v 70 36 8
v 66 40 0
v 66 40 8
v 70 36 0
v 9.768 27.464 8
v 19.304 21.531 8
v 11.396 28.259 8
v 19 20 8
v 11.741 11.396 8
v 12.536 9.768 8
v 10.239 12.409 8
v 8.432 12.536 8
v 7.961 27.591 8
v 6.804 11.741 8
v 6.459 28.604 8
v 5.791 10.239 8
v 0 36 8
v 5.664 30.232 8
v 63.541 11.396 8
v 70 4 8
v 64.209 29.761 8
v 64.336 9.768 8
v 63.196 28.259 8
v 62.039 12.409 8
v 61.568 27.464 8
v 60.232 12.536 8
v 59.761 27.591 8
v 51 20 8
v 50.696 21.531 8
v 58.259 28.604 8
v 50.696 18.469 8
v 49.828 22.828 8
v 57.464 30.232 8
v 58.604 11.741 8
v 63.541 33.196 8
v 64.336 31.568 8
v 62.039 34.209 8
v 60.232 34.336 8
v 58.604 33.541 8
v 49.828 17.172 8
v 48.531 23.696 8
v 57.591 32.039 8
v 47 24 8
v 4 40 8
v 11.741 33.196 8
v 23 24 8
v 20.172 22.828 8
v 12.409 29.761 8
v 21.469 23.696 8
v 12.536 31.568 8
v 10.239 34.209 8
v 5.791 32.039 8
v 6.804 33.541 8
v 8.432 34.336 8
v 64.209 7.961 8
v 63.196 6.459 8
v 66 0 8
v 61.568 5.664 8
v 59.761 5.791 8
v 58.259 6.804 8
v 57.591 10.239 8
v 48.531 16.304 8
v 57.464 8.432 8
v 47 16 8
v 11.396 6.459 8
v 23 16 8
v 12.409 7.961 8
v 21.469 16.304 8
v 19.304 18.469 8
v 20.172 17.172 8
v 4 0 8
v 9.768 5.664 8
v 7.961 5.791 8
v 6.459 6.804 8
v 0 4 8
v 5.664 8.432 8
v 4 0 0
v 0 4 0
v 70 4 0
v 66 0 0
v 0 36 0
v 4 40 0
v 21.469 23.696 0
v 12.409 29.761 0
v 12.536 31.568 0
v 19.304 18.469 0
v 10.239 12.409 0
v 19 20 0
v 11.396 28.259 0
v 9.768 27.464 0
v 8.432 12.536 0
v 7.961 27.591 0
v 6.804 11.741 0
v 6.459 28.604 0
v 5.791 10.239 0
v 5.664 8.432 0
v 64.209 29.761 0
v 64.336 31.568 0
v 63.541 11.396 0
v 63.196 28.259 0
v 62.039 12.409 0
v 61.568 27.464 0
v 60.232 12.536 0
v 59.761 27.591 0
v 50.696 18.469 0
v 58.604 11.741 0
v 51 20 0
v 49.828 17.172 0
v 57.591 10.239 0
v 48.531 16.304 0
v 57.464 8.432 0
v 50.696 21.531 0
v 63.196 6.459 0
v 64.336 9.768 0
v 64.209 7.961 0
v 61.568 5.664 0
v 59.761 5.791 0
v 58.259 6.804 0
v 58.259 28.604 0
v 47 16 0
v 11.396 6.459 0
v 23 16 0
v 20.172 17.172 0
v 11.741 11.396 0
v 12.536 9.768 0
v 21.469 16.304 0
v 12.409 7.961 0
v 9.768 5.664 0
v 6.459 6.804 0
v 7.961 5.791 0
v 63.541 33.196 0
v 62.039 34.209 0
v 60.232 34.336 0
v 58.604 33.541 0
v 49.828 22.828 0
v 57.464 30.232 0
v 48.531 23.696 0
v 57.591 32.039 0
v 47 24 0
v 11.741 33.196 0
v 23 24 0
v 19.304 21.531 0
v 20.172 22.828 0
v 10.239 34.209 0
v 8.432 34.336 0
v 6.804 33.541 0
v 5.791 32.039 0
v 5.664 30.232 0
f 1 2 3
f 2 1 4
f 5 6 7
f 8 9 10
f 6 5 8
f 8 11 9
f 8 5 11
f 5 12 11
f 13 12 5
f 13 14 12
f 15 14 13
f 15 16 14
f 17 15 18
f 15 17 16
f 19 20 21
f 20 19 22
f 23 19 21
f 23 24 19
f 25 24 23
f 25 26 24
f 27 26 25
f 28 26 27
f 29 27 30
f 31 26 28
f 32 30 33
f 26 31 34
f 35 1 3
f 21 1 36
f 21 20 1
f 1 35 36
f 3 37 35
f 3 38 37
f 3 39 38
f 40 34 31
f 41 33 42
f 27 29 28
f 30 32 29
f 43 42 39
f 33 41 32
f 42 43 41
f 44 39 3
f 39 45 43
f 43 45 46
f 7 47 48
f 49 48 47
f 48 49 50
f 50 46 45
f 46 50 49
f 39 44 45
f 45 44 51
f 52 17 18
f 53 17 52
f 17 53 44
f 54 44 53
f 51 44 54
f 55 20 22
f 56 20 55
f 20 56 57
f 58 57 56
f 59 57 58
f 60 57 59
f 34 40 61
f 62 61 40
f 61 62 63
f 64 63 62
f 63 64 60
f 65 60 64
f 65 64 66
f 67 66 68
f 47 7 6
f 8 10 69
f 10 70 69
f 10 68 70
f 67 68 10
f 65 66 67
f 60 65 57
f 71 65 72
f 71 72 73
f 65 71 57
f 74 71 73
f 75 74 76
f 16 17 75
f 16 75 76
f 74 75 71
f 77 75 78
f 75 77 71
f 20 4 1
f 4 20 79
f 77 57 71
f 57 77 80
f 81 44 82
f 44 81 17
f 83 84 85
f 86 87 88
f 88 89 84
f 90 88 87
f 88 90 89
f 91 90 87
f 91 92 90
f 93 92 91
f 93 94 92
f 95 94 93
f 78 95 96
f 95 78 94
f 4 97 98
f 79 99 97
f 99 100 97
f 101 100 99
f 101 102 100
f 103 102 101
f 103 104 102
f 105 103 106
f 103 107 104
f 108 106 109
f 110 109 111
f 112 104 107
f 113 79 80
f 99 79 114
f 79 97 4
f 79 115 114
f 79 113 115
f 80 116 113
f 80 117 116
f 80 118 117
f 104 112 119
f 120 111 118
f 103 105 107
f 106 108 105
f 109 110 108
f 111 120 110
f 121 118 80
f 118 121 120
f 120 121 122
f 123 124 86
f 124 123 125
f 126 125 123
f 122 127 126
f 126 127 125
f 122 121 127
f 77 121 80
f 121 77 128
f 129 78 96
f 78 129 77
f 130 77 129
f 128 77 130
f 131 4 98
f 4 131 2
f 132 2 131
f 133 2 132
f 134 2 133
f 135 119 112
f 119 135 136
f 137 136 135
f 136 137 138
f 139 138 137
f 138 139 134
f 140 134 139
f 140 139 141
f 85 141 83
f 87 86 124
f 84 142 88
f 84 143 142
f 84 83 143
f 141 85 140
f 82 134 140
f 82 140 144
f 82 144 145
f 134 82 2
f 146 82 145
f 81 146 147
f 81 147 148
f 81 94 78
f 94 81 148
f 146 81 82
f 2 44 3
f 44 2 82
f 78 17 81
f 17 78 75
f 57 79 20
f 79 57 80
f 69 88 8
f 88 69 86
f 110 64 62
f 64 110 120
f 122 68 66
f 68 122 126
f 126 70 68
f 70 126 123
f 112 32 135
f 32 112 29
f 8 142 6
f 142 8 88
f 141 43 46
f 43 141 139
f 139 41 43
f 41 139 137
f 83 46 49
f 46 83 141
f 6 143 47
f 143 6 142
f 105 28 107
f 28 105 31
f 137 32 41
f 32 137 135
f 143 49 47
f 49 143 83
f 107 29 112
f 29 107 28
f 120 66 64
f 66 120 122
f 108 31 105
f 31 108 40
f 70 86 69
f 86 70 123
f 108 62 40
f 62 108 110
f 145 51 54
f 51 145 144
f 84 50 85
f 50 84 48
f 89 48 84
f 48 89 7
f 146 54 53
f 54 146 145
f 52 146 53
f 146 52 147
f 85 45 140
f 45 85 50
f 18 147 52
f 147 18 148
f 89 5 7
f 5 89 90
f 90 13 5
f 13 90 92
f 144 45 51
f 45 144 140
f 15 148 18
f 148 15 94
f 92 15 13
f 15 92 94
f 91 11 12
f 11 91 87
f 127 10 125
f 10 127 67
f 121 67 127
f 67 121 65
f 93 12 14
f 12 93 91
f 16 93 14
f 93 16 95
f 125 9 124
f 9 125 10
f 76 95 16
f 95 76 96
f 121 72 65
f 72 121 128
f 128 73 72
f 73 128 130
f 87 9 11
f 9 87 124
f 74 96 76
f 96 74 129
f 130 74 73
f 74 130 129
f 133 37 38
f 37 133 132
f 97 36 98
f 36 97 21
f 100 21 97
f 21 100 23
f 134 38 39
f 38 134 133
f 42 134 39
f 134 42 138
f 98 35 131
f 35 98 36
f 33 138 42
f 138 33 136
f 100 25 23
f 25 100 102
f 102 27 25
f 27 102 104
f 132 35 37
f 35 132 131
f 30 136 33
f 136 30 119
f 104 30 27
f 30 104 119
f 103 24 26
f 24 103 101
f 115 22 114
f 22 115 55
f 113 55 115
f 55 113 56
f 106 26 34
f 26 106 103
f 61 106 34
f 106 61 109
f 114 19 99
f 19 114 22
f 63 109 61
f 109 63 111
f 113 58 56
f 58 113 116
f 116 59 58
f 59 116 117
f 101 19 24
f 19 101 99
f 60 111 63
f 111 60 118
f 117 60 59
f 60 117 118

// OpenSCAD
$fn = 32;

// ----------------------------------------------------------------------
// Bracket plate: slot plate 70 x 40
// ----------------------------------------------------------------------

// --- parameters (mm) ---
hole_r = 3.5;             // bolt hole radius
plate_t = 8;              // plate thickness, Z (extrusion height)
plate_l = 70;             // plate length
plate_w = 40;             // plate width
slot_l = 24;              // slot straight length
slot_r = 4;               // slot end radius

slot_len = slot_l + 2 * slot_r;
slot_w = 2 * slot_r;
hole_d2 = 2 * hole_r;

profile = [[4, 0], [66, 0], [70, 4], [70, 36], [66, 40], [4, 40], [0, 36], [0, 4]];  // primary outline, 8 points, counter clockwise
void_1 = [[47, 16], [48.531, 16.304], [49.828, 17.172], [50.696, 18.469], [51, 20], [50.696, 21.531], [49.828, 22.828], [48.531, 23.696], [47, 24], [23, 24], [21.469, 23.696], [20.172, 22.828], [19.304, 21.531], [19, 20], [19.304, 18.469], [20.172, 17.172], [21.469, 16.304], [23, 16]];  // grip slot, 18 points
void_2 = [[12.536, 31.568], [11.741, 33.196], [10.239, 34.209], [8.432, 34.336], [6.804, 33.541], [5.791, 32.039], [5.664, 30.232], [6.459, 28.604], [7.961, 27.591], [9.768, 27.464], [11.396, 28.259], [12.409, 29.761]];  // corner hole, 12 points
void_3 = [[12.536, 9.768], [11.741, 11.396], [10.239, 12.409], [8.432, 12.536], [6.804, 11.741], [5.791, 10.239], [5.664, 8.432], [6.459, 6.804], [7.961, 5.791], [9.768, 5.664], [11.396, 6.459], [12.409, 7.961]];  // corner hole, 12 points
void_4 = [[64.336, 31.568], [63.541, 33.196], [62.039, 34.209], [60.232, 34.336], [58.604, 33.541], [57.591, 32.039], [57.464, 30.232], [58.259, 28.604], [59.761, 27.591], [61.568, 27.464], [63.196, 28.259], [64.209, 29.761]];  // corner hole, 12 points
void_5 = [[64.336, 9.768], [63.541, 11.396], [62.039, 12.409], [60.232, 12.536], [58.604, 11.741], [57.591, 10.239], [57.464, 8.432], [58.259, 6.804], [59.761, 5.791], [61.568, 5.664], [63.196, 6.459], [64.209, 7.961]];  // corner hole, 12 points

// --- the one profile operation ---
difference() {
  linear_extrude(height = plate_t) polygon(points = profile);
  translate([0, 0, -1])
    linear_extrude(height = plate_t + 2) polygon(points = void_1);
  translate([0, 0, -1])
    linear_extrude(height = plate_t + 2) polygon(points = void_2);
  translate([0, 0, -1])
    linear_extrude(height = plate_t + 2) polygon(points = void_3);
  translate([0, 0, -1])
    linear_extrude(height = plate_t + 2) polygon(points = void_4);
  translate([0, 0, -1])
    linear_extrude(height = plate_t + 2) polygon(points = void_5);
}
